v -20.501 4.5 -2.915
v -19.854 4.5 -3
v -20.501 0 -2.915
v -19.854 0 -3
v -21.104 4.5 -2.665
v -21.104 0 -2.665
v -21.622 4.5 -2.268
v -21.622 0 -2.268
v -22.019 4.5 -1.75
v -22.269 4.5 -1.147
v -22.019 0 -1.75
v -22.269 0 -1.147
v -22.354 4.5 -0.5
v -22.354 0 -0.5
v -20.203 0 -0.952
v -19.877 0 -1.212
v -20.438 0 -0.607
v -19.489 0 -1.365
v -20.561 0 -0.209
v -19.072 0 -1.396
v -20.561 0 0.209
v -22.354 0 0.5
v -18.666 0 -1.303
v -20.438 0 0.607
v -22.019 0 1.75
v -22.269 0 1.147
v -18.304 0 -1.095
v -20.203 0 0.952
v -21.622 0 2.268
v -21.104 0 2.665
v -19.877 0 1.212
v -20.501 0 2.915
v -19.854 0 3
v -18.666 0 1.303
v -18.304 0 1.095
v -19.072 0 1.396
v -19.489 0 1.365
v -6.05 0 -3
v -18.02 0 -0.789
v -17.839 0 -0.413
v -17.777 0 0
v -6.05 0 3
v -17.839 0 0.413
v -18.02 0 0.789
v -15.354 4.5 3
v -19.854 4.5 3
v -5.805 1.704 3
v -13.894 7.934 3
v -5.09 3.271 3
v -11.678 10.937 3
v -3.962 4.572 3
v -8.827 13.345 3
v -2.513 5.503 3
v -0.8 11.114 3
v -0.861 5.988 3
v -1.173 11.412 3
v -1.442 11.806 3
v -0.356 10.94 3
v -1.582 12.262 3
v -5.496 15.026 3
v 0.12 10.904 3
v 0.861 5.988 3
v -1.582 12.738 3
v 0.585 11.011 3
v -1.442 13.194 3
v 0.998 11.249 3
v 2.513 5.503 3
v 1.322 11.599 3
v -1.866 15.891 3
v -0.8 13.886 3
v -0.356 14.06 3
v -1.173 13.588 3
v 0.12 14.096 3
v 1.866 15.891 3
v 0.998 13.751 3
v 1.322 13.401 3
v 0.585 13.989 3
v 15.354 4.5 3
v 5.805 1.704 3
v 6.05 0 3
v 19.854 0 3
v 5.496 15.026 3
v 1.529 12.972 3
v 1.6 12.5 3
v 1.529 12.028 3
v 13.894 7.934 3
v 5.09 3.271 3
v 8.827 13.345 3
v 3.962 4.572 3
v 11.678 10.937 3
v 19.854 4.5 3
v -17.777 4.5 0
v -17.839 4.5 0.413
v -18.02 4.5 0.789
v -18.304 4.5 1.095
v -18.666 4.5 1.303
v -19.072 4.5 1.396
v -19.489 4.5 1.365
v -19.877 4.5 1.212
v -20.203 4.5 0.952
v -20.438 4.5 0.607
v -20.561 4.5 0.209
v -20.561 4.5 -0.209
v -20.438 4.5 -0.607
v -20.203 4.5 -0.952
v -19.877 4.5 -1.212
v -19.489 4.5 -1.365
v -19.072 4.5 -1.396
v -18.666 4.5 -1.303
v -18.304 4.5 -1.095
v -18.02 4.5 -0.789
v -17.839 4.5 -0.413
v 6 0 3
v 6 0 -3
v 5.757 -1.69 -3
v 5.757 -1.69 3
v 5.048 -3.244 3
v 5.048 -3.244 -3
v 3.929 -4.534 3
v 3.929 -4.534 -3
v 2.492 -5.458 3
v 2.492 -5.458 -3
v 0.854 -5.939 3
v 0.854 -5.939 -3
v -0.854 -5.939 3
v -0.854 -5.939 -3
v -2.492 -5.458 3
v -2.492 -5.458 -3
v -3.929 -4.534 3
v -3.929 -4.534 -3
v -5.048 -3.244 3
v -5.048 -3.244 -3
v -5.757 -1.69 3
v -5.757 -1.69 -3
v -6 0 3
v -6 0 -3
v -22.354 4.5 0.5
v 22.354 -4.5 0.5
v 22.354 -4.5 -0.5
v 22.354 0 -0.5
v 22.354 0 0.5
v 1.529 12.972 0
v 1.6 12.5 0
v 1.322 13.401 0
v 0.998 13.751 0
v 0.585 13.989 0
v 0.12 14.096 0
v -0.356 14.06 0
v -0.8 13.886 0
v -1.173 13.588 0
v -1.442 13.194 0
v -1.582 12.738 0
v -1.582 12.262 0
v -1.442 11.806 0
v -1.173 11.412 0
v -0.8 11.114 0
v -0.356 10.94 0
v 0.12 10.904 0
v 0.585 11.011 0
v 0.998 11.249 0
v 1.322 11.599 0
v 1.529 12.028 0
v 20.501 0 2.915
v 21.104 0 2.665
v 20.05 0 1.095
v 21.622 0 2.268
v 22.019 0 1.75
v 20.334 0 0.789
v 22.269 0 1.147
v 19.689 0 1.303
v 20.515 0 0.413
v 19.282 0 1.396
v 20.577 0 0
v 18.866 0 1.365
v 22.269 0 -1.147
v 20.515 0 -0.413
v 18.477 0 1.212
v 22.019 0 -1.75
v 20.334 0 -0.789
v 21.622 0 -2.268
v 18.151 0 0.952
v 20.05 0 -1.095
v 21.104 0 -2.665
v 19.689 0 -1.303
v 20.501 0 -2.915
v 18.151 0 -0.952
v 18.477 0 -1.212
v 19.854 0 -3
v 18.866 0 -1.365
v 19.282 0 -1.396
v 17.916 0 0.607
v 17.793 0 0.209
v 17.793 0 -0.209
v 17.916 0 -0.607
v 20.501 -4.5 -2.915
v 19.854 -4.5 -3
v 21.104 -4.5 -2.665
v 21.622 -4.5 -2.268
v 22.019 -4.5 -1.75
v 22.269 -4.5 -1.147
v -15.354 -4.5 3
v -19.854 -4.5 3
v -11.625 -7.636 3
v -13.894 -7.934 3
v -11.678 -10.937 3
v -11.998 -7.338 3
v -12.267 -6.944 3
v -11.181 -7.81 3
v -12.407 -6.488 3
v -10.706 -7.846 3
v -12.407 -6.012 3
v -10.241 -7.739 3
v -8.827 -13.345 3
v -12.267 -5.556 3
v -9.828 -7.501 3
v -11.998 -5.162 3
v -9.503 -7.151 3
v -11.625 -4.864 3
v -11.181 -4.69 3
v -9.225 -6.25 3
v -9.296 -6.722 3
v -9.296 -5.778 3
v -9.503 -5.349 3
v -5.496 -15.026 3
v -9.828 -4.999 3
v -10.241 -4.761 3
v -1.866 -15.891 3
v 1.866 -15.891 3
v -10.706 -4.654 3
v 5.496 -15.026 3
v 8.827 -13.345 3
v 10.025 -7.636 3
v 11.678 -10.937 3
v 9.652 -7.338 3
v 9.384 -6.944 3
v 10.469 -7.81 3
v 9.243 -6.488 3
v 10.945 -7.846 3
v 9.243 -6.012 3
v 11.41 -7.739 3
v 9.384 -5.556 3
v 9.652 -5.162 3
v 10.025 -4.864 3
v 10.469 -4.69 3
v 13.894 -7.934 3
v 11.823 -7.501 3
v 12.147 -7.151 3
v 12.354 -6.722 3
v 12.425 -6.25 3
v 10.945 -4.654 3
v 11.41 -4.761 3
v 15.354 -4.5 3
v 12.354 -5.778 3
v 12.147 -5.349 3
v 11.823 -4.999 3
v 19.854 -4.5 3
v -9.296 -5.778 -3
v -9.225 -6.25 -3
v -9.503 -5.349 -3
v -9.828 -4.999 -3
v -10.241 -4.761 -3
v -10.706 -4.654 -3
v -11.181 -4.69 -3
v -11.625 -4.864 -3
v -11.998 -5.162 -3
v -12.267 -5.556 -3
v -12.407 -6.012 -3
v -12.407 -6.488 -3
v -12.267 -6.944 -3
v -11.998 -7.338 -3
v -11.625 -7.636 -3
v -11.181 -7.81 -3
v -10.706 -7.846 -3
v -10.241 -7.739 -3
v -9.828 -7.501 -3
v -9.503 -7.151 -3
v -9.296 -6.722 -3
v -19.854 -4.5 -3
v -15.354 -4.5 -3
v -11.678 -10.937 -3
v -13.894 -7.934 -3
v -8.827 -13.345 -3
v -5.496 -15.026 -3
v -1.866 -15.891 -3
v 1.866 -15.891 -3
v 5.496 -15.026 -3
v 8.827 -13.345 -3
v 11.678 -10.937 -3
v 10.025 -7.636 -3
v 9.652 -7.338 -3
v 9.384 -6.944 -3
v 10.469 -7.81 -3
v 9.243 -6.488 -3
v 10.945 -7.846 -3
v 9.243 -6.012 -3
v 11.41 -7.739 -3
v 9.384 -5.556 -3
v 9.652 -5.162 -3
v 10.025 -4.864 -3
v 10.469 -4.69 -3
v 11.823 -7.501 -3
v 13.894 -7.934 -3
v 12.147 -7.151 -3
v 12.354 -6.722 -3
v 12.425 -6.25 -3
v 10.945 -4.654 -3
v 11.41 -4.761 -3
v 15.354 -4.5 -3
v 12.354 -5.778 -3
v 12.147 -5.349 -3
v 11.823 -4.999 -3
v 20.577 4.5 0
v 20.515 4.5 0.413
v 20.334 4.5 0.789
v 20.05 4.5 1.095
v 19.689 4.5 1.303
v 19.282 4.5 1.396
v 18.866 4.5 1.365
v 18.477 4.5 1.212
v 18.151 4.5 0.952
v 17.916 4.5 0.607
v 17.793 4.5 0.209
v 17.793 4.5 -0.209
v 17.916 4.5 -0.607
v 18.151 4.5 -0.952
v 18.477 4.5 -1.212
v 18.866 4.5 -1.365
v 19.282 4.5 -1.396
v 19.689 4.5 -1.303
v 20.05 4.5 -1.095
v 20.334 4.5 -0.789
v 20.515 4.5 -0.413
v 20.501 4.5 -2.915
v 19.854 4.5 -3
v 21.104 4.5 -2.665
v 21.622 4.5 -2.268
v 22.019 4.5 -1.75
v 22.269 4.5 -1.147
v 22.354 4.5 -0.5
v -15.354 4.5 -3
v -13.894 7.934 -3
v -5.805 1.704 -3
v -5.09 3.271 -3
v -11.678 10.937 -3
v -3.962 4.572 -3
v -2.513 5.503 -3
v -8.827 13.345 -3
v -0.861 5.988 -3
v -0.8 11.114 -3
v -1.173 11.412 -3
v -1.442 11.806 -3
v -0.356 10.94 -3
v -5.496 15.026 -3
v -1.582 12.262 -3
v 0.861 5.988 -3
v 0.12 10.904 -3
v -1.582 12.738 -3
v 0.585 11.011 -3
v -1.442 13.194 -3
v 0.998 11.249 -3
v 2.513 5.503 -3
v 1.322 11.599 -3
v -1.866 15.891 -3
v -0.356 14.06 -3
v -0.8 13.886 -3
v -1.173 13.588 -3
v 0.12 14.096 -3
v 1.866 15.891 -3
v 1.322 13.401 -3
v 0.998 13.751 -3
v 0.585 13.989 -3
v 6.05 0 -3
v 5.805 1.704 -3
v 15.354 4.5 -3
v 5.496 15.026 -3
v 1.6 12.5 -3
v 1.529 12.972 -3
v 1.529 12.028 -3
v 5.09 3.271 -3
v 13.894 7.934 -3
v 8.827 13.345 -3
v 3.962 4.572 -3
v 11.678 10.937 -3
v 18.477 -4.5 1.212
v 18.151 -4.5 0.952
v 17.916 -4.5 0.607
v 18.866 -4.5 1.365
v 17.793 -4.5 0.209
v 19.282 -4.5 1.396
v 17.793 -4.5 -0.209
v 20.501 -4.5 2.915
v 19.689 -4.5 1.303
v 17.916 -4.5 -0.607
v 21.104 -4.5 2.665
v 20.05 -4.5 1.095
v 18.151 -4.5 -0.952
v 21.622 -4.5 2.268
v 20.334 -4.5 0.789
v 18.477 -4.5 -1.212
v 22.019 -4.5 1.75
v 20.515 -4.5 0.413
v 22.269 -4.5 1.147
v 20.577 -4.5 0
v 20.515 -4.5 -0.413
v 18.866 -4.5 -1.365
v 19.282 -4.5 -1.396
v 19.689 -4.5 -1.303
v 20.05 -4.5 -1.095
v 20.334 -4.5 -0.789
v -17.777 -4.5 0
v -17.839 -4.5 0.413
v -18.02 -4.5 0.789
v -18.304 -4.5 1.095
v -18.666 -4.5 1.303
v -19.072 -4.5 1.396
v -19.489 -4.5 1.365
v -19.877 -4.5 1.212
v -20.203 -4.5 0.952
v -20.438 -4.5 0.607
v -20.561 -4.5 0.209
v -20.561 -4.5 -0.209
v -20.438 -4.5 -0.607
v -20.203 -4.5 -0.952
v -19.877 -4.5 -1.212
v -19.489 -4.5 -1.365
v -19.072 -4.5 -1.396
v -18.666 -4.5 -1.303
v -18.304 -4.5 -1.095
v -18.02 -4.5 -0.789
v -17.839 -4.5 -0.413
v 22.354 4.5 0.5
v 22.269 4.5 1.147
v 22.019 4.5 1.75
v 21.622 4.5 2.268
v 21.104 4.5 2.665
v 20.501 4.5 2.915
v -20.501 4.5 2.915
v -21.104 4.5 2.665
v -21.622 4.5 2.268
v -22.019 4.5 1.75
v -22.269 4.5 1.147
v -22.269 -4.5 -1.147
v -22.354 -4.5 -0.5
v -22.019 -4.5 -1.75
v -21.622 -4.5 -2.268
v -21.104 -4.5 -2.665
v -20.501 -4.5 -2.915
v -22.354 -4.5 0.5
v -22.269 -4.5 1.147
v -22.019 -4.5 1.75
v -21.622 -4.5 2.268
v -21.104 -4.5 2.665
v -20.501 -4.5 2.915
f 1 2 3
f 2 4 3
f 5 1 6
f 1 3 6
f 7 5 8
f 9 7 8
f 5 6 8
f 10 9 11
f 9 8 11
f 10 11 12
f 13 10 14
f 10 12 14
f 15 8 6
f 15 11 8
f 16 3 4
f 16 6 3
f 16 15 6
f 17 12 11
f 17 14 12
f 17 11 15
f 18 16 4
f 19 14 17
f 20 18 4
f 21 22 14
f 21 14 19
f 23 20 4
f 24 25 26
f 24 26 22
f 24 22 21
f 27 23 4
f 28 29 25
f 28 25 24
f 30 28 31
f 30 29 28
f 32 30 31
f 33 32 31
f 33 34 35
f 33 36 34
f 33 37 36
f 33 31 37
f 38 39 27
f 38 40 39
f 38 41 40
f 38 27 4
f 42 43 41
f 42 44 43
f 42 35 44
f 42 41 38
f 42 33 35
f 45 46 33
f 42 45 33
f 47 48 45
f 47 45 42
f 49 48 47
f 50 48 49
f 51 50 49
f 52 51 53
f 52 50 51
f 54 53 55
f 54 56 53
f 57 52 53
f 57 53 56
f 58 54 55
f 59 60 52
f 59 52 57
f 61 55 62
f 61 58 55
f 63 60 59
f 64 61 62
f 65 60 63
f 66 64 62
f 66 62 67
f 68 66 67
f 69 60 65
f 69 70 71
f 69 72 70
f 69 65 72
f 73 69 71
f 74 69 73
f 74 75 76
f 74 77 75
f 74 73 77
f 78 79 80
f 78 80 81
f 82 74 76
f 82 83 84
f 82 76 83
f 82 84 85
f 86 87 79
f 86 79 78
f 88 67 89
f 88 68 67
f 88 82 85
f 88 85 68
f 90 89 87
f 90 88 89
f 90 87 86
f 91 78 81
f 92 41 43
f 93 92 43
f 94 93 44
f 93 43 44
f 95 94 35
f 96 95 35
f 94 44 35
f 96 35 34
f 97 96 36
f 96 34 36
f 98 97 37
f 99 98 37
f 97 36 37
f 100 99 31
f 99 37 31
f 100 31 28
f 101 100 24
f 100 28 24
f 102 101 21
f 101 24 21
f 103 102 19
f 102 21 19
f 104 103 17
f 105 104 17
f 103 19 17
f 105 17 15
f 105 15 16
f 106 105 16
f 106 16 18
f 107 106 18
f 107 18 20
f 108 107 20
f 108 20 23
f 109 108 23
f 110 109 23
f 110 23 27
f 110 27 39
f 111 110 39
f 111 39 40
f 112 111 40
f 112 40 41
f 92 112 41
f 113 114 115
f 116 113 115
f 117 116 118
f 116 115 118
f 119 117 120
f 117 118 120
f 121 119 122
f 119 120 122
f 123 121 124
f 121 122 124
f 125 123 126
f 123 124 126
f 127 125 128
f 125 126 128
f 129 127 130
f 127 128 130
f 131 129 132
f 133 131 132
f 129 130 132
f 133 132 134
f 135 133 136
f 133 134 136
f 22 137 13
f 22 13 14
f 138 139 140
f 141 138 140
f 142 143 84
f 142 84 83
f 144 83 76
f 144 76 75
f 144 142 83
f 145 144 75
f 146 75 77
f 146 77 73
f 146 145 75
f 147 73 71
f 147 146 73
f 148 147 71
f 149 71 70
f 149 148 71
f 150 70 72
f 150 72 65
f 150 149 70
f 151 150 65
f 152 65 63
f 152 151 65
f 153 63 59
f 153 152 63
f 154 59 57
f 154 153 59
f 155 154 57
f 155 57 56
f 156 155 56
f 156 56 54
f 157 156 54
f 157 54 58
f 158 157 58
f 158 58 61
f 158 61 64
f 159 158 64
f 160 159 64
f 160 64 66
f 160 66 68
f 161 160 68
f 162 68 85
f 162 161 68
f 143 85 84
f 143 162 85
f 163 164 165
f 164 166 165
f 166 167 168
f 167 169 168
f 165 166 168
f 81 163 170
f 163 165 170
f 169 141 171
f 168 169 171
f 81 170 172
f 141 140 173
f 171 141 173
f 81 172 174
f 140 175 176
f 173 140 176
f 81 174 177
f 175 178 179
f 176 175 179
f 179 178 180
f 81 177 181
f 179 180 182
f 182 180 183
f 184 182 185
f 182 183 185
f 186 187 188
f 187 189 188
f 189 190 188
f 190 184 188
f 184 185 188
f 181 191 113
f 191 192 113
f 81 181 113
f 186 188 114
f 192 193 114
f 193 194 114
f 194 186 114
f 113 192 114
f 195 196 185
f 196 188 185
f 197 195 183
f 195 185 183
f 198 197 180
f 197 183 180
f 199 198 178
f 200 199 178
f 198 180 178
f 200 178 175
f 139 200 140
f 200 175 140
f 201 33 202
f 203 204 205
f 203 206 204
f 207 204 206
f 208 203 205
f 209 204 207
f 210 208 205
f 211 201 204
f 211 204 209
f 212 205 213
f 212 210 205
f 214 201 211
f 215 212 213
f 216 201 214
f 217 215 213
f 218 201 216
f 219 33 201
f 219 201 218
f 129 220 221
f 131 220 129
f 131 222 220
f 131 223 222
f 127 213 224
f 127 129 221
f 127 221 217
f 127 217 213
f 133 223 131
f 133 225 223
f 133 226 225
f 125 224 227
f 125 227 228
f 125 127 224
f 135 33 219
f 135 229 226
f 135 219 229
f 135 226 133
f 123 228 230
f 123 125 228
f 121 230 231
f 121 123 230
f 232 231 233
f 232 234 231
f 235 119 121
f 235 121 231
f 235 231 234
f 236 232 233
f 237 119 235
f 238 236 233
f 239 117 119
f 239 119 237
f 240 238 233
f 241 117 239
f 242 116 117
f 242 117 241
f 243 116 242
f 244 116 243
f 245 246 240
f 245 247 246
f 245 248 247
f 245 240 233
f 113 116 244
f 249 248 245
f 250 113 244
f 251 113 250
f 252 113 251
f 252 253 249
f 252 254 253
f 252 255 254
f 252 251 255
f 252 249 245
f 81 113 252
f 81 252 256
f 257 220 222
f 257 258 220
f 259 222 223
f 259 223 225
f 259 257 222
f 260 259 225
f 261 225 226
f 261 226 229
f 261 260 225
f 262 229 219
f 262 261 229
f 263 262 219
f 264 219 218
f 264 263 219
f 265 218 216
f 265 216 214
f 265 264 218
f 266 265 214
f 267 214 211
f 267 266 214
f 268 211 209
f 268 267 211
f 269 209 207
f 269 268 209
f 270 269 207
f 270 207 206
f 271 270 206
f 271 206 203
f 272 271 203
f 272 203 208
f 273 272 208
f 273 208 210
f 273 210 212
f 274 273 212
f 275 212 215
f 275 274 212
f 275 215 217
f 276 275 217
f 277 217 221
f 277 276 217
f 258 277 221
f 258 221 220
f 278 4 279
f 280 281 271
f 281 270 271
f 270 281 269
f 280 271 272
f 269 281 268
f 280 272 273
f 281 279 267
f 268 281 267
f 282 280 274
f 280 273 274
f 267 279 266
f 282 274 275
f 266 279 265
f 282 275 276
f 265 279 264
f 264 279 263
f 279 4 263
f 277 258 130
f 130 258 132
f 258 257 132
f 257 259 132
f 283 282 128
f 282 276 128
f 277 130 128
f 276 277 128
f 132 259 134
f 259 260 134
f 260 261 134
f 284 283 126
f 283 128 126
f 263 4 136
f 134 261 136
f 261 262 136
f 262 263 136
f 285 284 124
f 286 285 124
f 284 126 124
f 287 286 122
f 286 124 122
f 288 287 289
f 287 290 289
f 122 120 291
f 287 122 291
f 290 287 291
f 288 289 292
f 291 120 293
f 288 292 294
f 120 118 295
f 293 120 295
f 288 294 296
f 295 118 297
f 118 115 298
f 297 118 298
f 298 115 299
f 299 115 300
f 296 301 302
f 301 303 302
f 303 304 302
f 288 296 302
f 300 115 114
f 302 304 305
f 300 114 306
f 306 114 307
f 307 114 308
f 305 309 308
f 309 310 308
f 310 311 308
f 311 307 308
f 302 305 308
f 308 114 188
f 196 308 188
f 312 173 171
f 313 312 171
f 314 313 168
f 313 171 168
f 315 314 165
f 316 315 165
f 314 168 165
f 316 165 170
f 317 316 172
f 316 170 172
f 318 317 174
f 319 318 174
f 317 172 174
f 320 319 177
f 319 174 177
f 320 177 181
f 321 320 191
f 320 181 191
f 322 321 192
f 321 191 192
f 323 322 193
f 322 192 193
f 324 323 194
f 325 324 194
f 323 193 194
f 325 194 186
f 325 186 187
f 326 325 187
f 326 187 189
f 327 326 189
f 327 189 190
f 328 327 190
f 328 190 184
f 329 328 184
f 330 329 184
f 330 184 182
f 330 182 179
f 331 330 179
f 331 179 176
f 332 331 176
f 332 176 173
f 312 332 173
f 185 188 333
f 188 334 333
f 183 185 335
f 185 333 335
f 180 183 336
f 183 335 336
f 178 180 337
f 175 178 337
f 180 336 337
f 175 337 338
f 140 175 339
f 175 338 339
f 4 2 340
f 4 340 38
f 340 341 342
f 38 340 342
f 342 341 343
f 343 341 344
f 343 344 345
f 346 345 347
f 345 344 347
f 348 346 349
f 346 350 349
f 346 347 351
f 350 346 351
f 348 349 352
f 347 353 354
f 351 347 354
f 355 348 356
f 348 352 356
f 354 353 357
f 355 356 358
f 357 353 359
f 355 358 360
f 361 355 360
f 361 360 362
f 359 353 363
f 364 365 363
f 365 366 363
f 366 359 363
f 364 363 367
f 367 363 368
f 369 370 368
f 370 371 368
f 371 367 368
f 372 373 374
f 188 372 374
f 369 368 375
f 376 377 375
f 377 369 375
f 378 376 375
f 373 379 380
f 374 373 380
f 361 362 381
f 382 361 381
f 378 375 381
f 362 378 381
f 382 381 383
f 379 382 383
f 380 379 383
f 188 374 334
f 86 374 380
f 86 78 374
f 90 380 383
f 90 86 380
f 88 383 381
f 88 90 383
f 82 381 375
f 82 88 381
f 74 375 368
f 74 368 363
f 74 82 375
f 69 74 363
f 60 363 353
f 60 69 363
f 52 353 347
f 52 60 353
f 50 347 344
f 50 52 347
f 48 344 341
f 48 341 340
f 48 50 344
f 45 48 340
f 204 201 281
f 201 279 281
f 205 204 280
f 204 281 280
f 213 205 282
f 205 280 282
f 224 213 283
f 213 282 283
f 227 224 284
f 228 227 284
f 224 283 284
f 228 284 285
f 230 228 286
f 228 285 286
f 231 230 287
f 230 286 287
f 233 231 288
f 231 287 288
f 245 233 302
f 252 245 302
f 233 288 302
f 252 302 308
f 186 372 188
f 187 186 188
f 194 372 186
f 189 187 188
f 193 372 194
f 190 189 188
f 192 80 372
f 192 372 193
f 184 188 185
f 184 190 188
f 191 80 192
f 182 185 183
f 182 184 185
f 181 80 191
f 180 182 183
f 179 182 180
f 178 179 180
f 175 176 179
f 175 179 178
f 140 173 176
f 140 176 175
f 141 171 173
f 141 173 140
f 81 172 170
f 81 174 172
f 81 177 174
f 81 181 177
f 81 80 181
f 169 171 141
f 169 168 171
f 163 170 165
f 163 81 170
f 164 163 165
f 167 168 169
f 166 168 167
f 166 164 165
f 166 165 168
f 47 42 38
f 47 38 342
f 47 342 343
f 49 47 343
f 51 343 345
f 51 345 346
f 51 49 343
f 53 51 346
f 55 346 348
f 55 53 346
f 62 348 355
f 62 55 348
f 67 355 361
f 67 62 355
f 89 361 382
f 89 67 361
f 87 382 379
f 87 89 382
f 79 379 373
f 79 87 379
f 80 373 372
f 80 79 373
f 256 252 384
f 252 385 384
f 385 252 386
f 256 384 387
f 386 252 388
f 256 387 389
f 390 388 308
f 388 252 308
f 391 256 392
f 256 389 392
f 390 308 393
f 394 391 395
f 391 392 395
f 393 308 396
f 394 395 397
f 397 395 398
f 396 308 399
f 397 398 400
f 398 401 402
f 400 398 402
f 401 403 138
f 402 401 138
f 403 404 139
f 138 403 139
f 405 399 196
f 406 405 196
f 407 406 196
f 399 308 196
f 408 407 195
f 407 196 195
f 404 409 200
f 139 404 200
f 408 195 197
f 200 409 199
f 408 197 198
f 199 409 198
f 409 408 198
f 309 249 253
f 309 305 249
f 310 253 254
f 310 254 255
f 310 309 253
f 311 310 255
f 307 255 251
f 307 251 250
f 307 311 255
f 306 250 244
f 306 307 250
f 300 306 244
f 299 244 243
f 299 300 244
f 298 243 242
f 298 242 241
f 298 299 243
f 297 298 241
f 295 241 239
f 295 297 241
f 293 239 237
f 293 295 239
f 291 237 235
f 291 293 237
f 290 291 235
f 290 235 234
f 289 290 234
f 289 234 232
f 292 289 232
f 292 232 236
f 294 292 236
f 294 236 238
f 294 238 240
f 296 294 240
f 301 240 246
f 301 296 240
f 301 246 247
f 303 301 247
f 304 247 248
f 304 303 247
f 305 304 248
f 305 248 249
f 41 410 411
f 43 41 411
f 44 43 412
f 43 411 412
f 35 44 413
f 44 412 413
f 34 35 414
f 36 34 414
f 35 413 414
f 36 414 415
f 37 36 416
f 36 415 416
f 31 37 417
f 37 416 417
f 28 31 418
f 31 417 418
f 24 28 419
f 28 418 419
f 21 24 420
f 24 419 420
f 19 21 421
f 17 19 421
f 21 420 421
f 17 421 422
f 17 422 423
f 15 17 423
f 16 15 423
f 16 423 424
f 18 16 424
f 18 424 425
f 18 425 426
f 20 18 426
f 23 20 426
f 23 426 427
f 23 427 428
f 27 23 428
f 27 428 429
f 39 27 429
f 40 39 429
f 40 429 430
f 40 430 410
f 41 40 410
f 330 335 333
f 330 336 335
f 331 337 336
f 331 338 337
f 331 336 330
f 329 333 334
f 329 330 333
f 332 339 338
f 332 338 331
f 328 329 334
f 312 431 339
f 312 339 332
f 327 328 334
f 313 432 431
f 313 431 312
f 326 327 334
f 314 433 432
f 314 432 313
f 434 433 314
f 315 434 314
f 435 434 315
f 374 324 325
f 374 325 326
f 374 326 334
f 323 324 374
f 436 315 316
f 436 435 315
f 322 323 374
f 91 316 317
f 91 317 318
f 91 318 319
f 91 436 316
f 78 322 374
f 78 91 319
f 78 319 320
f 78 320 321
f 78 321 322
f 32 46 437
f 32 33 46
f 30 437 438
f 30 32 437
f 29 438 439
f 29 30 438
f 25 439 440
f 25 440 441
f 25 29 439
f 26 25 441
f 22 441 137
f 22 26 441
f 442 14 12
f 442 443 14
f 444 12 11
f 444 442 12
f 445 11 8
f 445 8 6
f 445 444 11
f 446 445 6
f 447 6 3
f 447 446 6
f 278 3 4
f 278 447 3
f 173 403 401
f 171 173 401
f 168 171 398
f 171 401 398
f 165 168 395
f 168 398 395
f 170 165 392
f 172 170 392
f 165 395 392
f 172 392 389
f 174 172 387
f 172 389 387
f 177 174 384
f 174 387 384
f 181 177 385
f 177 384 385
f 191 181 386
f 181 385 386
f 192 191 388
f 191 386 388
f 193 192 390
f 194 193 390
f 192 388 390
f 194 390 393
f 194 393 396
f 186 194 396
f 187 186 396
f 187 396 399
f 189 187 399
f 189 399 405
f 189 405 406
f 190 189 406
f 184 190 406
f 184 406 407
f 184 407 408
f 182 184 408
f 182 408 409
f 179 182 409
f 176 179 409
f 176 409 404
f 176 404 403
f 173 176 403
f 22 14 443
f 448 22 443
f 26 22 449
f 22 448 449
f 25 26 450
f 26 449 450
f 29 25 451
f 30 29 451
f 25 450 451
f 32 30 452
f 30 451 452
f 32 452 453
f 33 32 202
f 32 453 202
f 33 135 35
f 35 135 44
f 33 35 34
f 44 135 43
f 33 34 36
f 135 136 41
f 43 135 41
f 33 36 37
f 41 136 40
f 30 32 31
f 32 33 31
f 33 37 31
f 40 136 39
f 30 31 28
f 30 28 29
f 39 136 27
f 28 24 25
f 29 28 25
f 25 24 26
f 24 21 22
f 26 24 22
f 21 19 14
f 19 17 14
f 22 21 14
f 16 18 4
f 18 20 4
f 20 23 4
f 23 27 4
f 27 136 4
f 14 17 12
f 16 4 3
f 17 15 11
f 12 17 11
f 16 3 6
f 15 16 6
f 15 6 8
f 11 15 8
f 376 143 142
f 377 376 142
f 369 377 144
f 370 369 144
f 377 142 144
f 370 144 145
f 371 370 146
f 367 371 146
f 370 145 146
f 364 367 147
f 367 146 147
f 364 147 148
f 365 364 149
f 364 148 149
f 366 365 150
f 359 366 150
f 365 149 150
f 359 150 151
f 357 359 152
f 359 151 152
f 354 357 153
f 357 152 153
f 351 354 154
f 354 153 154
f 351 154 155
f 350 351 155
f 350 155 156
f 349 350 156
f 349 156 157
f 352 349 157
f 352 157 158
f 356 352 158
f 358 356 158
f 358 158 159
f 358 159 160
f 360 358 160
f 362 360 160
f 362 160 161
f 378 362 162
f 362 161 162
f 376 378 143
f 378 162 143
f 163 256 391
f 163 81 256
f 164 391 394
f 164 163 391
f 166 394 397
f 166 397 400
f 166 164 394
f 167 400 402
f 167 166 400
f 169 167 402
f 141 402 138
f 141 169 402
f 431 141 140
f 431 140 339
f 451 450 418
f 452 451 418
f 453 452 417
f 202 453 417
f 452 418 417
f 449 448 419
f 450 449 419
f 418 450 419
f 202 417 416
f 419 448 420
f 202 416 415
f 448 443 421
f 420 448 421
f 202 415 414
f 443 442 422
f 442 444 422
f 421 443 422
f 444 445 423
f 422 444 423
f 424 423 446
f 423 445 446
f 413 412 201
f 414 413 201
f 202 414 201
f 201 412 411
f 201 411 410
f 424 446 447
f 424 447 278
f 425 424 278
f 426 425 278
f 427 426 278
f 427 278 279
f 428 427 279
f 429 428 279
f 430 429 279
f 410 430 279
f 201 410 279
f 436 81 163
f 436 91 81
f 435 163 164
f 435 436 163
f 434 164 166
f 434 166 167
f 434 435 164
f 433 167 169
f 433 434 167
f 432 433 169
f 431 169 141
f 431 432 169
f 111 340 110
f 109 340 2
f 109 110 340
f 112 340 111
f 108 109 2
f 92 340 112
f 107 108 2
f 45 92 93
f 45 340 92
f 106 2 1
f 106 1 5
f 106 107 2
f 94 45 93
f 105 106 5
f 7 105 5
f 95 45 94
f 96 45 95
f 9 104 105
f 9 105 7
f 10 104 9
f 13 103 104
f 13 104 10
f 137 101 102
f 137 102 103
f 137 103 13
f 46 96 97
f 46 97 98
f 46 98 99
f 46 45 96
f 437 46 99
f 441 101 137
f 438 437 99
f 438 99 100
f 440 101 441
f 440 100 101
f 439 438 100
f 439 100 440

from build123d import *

# Parameters (mm, degrees)
F0_R      = 1.6
F1_DEPTH  = 3
F2_DEPTH  = 3
F3_R      = 1.4
F4_DEPTH  = 16.001
F5_R      = 2.5
F6_R      = 1.6
F7_DEPTH  = 3
F8_DEPTH  = 3
F9_R      = 1.4
F10_DEPTH = 25
F11_R     = 2.5


# Not quite as in the source:
# - a feature names something its author has since deleted; it is built from what else it names


with BuildPart() as f1:
    # F0 (on Top) → F1 (new body)
    with BuildSketch(Plane.XY):
        with BuildLine():
            ThreePointArc((-16, 0), (-15.8377151213, 2.273055155), (-15.3541525328, 4.5))
            Line((-15.3541525328, 4.5), (-22.3541525328, 4.5))
            Line((-22.3541525328, 4.5), (-22.3541525328, 0))
            Line((-22.3541525328, 0), (-16, 0))
        make_face()
        with BuildLine():
            Line((7.65, 0), (16, 0))
            ThreePointArc((16, 0), (15.8377151213, 2.273055155), (15.3541525328, 4.5))
            ThreePointArc((15.3541525328, 4.5), (0, 16), (-15.3541525328, 4.5))
            ThreePointArc((-15.3541525328, 4.5), (-15.8377151213, 2.273055155), (-16, 0))
            Line((-16, 0), (-7.65, 0))
            ThreePointArc((-7.65, 0), (0, 7.65), (7.65, 0))
        make_face()
        with Locations((0, 12.5)):
            Circle(F0_R, mode=Mode.SUBTRACT)
        with BuildLine():
            ThreePointArc((-6.05, 0), (0, 6.05), (6.05, 0))
            Line((6.05, 0), (7.65, 0))
            ThreePointArc((7.65, 0), (0, 7.65), (-7.65, 0))
            Line((-7.65, 0), (-6.05, 0))
        make_face()
        with BuildLine():
            ThreePointArc((15.3541525328, 4.5), (15.8377151213, 2.273055155), (16, 0))
            Line((16, 0), (22.3541525328, 0))
            Line((22.3541525328, 0), (22.3541525328, 4.5))
            Line((22.3541525328, 4.5), (15.3541525328, 4.5))
        make_face()
    extrude(amount=F1_DEPTH)

    # F0 (on Top) → F2 (join)
    with BuildSketch(Plane.XY):
        with BuildLine():
            Line((7.65, 0), (16, 0))
            ThreePointArc((16, 0), (15.8377151213, 2.273055155), (15.3541525328, 4.5))
            ThreePointArc((15.3541525328, 4.5), (0, 16), (-15.3541525328, 4.5))
            ThreePointArc((-15.3541525328, 4.5), (-15.8377151213, 2.273055155), (-16, 0))
            Line((-16, 0), (-7.65, 0))
            ThreePointArc((-7.65, 0), (0, 7.65), (7.65, 0))
        make_face()
        with Locations((0, 12.5)):
            Circle(F0_R, mode=Mode.SUBTRACT)
        with BuildLine():
            ThreePointArc((-6.05, 0), (0, 6.05), (6.05, 0))
            Line((6.05, 0), (7.65, 0))
            ThreePointArc((7.65, 0), (0, 7.65), (-7.65, 0))
            Line((-7.65, 0), (-6.05, 0))
        make_face()
        with BuildLine():
            ThreePointArc((15.3541525328, 4.5), (15.8377151213, 2.273055155), (16, 0))
            Line((16, 0), (22.3541525328, 0))
            Line((22.3541525328, 0), (22.3541525328, 4.5))
            Line((22.3541525328, 4.5), (15.3541525328, 4.5))
        make_face()
        with BuildLine():
            ThreePointArc((-16, 0), (-15.8377151213, 2.273055155), (-15.3541525328, 4.5))
            Line((-15.3541525328, 4.5), (-22.3541525328, 4.5))
            Line((-22.3541525328, 4.5), (-22.3541525328, 0))
            Line((-22.3541525328, 0), (-16, 0))
        make_face()
    extrude(amount=-F2_DEPTH)

    # F3 (on face) → F4 (cut, through all)
    with BuildSketch(Plane.XZ):
        with Locations((19.1770762664, 0)):
            Circle(F3_R)
        with Locations((-19.1770762664, 0)):
            Circle(F3_R)
    extrude(amount=-F4_DEPTH, mode=Mode.SUBTRACT)

    # F5
    f5_edges = [f1.edges().sort_by_distance(p)[0] for p in [
        (-22.354153, 2.25, 3),
        (22.354153, 2.25, 3),
        (-22.354153, 2.25, -3),
        (22.354153, 2.25, -3),
    ]]
    fillet(f5_edges, radius=F5_R)


with BuildPart() as f7:
    # F6 (on Top) → F7 (new body)
    with BuildSketch(Plane.XY):
        with BuildLine():
            ThreePointArc((6, 0), (0, -6), (-6, 0))
            Line((-6, 0), (-9, 0))
            ThreePointArc((-9, 0), (0, -9), (9, 0))
            Line((9, 0), (6, 0))
        make_face()
        with BuildLine():
            ThreePointArc((9, 0), (0, -9), (-9, 0))
            Line((-9, 0), (-16, 0))
            ThreePointArc((-16, 0), (-15.8377151213, -2.273055155), (-15.3541525328, -4.5))
            ThreePointArc((-15.3541525328, -4.5), (0, -16), (15.3541525328, -4.5))
            ThreePointArc((15.3541525328, -4.5), (15.8377151213, -2.273055155), (16, 0))
            Line((16, 0), (9, 0))
        make_face()
        with Locations((-10.8253175473, -6.25)):
            Circle(F6_R, mode=Mode.SUBTRACT)
        with Locations((10.8253175473, -6.25)):
            Circle(F6_R, mode=Mode.SUBTRACT)
        with BuildLine():
            ThreePointArc((-15.3541525328, -4.5), (-15.8377151213, -2.273055155), (-16, 0))
            Line((-16, 0), (-22.3541525328, 0))
            Line((-22.3541525328, 0), (-22.3541525328, -4.5))
            Line((-22.3541525328, -4.5), (-15.3541525328, -4.5))
        make_face()
        with BuildLine():
            Line((22.3541525328, 0), (16, 0))
            ThreePointArc((16, 0), (15.8377151213, -2.273055155), (15.3541525328, -4.5))
            Line((15.3541525328, -4.5), (22.3541525328, -4.5))
            Line((22.3541525328, -4.5), (22.3541525328, 0))
        make_face()
    extrude(amount=-F7_DEPTH)

    # F6 (on Top) → F8 (join)
    with BuildSketch(Plane.XY):
        with BuildLine():
            ThreePointArc((-15.3541525328, -4.5), (-15.8377151213, -2.273055155), (-16, 0))
            Line((-16, 0), (-22.3541525328, 0))
            Line((-22.3541525328, 0), (-22.3541525328, -4.5))
            Line((-22.3541525328, -4.5), (-15.3541525328, -4.5))
        make_face()
        with BuildLine():
            Line((22.3541525328, 0), (16, 0))
            ThreePointArc((16, 0), (15.8377151213, -2.273055155), (15.3541525328, -4.5))
            Line((15.3541525328, -4.5), (22.3541525328, -4.5))
            Line((22.3541525328, -4.5), (22.3541525328, 0))
        make_face()
        with BuildLine():
            ThreePointArc((9, 0), (0, -9), (-9, 0))
            Line((-9, 0), (-16, 0))
            ThreePointArc((-16, 0), (-15.8377151213, -2.273055155), (-15.3541525328, -4.5))
            ThreePointArc((-15.3541525328, -4.5), (0, -16), (15.3541525328, -4.5))
            ThreePointArc((15.3541525328, -4.5), (15.8377151213, -2.273055155), (16, 0))
            Line((16, 0), (9, 0))
        make_face()
        with Locations((-10.8253175473, -6.25)):
            Circle(F6_R, mode=Mode.SUBTRACT)
        with Locations((10.8253175473, -6.25)):
            Circle(F6_R, mode=Mode.SUBTRACT)
        with BuildLine():
            ThreePointArc((6, 0), (0, -6), (-6, 0))
            Line((-6, 0), (-9, 0))
            ThreePointArc((-9, 0), (0, -9), (9, 0))
            Line((9, 0), (6, 0))
        make_face()
    extrude(amount=F8_DEPTH)

    # F9 (on face) → F10 (cut)
    with BuildSketch(Plane.XZ.offset(4.5)):
        with Locations((-19.1770762664, 0)):
            Circle(F9_R)
        with Locations((19.1770762664, 0)):
            Circle(F9_R)
    extrude(amount=-F10_DEPTH, mode=Mode.SUBTRACT)

    # F11
    f11_edges = [f7.edges().sort_by_distance(p)[0] for p in [
        (22.354153, -2.25, -3),
        (22.354153, -2.25, 3),
        (-22.354153, -2.25, 3),
        (-22.354153, -2.25, -3),
    ]]
    fillet(f11_edges, radius=F11_R)


solid = Compound([f1.part, f7.part])
